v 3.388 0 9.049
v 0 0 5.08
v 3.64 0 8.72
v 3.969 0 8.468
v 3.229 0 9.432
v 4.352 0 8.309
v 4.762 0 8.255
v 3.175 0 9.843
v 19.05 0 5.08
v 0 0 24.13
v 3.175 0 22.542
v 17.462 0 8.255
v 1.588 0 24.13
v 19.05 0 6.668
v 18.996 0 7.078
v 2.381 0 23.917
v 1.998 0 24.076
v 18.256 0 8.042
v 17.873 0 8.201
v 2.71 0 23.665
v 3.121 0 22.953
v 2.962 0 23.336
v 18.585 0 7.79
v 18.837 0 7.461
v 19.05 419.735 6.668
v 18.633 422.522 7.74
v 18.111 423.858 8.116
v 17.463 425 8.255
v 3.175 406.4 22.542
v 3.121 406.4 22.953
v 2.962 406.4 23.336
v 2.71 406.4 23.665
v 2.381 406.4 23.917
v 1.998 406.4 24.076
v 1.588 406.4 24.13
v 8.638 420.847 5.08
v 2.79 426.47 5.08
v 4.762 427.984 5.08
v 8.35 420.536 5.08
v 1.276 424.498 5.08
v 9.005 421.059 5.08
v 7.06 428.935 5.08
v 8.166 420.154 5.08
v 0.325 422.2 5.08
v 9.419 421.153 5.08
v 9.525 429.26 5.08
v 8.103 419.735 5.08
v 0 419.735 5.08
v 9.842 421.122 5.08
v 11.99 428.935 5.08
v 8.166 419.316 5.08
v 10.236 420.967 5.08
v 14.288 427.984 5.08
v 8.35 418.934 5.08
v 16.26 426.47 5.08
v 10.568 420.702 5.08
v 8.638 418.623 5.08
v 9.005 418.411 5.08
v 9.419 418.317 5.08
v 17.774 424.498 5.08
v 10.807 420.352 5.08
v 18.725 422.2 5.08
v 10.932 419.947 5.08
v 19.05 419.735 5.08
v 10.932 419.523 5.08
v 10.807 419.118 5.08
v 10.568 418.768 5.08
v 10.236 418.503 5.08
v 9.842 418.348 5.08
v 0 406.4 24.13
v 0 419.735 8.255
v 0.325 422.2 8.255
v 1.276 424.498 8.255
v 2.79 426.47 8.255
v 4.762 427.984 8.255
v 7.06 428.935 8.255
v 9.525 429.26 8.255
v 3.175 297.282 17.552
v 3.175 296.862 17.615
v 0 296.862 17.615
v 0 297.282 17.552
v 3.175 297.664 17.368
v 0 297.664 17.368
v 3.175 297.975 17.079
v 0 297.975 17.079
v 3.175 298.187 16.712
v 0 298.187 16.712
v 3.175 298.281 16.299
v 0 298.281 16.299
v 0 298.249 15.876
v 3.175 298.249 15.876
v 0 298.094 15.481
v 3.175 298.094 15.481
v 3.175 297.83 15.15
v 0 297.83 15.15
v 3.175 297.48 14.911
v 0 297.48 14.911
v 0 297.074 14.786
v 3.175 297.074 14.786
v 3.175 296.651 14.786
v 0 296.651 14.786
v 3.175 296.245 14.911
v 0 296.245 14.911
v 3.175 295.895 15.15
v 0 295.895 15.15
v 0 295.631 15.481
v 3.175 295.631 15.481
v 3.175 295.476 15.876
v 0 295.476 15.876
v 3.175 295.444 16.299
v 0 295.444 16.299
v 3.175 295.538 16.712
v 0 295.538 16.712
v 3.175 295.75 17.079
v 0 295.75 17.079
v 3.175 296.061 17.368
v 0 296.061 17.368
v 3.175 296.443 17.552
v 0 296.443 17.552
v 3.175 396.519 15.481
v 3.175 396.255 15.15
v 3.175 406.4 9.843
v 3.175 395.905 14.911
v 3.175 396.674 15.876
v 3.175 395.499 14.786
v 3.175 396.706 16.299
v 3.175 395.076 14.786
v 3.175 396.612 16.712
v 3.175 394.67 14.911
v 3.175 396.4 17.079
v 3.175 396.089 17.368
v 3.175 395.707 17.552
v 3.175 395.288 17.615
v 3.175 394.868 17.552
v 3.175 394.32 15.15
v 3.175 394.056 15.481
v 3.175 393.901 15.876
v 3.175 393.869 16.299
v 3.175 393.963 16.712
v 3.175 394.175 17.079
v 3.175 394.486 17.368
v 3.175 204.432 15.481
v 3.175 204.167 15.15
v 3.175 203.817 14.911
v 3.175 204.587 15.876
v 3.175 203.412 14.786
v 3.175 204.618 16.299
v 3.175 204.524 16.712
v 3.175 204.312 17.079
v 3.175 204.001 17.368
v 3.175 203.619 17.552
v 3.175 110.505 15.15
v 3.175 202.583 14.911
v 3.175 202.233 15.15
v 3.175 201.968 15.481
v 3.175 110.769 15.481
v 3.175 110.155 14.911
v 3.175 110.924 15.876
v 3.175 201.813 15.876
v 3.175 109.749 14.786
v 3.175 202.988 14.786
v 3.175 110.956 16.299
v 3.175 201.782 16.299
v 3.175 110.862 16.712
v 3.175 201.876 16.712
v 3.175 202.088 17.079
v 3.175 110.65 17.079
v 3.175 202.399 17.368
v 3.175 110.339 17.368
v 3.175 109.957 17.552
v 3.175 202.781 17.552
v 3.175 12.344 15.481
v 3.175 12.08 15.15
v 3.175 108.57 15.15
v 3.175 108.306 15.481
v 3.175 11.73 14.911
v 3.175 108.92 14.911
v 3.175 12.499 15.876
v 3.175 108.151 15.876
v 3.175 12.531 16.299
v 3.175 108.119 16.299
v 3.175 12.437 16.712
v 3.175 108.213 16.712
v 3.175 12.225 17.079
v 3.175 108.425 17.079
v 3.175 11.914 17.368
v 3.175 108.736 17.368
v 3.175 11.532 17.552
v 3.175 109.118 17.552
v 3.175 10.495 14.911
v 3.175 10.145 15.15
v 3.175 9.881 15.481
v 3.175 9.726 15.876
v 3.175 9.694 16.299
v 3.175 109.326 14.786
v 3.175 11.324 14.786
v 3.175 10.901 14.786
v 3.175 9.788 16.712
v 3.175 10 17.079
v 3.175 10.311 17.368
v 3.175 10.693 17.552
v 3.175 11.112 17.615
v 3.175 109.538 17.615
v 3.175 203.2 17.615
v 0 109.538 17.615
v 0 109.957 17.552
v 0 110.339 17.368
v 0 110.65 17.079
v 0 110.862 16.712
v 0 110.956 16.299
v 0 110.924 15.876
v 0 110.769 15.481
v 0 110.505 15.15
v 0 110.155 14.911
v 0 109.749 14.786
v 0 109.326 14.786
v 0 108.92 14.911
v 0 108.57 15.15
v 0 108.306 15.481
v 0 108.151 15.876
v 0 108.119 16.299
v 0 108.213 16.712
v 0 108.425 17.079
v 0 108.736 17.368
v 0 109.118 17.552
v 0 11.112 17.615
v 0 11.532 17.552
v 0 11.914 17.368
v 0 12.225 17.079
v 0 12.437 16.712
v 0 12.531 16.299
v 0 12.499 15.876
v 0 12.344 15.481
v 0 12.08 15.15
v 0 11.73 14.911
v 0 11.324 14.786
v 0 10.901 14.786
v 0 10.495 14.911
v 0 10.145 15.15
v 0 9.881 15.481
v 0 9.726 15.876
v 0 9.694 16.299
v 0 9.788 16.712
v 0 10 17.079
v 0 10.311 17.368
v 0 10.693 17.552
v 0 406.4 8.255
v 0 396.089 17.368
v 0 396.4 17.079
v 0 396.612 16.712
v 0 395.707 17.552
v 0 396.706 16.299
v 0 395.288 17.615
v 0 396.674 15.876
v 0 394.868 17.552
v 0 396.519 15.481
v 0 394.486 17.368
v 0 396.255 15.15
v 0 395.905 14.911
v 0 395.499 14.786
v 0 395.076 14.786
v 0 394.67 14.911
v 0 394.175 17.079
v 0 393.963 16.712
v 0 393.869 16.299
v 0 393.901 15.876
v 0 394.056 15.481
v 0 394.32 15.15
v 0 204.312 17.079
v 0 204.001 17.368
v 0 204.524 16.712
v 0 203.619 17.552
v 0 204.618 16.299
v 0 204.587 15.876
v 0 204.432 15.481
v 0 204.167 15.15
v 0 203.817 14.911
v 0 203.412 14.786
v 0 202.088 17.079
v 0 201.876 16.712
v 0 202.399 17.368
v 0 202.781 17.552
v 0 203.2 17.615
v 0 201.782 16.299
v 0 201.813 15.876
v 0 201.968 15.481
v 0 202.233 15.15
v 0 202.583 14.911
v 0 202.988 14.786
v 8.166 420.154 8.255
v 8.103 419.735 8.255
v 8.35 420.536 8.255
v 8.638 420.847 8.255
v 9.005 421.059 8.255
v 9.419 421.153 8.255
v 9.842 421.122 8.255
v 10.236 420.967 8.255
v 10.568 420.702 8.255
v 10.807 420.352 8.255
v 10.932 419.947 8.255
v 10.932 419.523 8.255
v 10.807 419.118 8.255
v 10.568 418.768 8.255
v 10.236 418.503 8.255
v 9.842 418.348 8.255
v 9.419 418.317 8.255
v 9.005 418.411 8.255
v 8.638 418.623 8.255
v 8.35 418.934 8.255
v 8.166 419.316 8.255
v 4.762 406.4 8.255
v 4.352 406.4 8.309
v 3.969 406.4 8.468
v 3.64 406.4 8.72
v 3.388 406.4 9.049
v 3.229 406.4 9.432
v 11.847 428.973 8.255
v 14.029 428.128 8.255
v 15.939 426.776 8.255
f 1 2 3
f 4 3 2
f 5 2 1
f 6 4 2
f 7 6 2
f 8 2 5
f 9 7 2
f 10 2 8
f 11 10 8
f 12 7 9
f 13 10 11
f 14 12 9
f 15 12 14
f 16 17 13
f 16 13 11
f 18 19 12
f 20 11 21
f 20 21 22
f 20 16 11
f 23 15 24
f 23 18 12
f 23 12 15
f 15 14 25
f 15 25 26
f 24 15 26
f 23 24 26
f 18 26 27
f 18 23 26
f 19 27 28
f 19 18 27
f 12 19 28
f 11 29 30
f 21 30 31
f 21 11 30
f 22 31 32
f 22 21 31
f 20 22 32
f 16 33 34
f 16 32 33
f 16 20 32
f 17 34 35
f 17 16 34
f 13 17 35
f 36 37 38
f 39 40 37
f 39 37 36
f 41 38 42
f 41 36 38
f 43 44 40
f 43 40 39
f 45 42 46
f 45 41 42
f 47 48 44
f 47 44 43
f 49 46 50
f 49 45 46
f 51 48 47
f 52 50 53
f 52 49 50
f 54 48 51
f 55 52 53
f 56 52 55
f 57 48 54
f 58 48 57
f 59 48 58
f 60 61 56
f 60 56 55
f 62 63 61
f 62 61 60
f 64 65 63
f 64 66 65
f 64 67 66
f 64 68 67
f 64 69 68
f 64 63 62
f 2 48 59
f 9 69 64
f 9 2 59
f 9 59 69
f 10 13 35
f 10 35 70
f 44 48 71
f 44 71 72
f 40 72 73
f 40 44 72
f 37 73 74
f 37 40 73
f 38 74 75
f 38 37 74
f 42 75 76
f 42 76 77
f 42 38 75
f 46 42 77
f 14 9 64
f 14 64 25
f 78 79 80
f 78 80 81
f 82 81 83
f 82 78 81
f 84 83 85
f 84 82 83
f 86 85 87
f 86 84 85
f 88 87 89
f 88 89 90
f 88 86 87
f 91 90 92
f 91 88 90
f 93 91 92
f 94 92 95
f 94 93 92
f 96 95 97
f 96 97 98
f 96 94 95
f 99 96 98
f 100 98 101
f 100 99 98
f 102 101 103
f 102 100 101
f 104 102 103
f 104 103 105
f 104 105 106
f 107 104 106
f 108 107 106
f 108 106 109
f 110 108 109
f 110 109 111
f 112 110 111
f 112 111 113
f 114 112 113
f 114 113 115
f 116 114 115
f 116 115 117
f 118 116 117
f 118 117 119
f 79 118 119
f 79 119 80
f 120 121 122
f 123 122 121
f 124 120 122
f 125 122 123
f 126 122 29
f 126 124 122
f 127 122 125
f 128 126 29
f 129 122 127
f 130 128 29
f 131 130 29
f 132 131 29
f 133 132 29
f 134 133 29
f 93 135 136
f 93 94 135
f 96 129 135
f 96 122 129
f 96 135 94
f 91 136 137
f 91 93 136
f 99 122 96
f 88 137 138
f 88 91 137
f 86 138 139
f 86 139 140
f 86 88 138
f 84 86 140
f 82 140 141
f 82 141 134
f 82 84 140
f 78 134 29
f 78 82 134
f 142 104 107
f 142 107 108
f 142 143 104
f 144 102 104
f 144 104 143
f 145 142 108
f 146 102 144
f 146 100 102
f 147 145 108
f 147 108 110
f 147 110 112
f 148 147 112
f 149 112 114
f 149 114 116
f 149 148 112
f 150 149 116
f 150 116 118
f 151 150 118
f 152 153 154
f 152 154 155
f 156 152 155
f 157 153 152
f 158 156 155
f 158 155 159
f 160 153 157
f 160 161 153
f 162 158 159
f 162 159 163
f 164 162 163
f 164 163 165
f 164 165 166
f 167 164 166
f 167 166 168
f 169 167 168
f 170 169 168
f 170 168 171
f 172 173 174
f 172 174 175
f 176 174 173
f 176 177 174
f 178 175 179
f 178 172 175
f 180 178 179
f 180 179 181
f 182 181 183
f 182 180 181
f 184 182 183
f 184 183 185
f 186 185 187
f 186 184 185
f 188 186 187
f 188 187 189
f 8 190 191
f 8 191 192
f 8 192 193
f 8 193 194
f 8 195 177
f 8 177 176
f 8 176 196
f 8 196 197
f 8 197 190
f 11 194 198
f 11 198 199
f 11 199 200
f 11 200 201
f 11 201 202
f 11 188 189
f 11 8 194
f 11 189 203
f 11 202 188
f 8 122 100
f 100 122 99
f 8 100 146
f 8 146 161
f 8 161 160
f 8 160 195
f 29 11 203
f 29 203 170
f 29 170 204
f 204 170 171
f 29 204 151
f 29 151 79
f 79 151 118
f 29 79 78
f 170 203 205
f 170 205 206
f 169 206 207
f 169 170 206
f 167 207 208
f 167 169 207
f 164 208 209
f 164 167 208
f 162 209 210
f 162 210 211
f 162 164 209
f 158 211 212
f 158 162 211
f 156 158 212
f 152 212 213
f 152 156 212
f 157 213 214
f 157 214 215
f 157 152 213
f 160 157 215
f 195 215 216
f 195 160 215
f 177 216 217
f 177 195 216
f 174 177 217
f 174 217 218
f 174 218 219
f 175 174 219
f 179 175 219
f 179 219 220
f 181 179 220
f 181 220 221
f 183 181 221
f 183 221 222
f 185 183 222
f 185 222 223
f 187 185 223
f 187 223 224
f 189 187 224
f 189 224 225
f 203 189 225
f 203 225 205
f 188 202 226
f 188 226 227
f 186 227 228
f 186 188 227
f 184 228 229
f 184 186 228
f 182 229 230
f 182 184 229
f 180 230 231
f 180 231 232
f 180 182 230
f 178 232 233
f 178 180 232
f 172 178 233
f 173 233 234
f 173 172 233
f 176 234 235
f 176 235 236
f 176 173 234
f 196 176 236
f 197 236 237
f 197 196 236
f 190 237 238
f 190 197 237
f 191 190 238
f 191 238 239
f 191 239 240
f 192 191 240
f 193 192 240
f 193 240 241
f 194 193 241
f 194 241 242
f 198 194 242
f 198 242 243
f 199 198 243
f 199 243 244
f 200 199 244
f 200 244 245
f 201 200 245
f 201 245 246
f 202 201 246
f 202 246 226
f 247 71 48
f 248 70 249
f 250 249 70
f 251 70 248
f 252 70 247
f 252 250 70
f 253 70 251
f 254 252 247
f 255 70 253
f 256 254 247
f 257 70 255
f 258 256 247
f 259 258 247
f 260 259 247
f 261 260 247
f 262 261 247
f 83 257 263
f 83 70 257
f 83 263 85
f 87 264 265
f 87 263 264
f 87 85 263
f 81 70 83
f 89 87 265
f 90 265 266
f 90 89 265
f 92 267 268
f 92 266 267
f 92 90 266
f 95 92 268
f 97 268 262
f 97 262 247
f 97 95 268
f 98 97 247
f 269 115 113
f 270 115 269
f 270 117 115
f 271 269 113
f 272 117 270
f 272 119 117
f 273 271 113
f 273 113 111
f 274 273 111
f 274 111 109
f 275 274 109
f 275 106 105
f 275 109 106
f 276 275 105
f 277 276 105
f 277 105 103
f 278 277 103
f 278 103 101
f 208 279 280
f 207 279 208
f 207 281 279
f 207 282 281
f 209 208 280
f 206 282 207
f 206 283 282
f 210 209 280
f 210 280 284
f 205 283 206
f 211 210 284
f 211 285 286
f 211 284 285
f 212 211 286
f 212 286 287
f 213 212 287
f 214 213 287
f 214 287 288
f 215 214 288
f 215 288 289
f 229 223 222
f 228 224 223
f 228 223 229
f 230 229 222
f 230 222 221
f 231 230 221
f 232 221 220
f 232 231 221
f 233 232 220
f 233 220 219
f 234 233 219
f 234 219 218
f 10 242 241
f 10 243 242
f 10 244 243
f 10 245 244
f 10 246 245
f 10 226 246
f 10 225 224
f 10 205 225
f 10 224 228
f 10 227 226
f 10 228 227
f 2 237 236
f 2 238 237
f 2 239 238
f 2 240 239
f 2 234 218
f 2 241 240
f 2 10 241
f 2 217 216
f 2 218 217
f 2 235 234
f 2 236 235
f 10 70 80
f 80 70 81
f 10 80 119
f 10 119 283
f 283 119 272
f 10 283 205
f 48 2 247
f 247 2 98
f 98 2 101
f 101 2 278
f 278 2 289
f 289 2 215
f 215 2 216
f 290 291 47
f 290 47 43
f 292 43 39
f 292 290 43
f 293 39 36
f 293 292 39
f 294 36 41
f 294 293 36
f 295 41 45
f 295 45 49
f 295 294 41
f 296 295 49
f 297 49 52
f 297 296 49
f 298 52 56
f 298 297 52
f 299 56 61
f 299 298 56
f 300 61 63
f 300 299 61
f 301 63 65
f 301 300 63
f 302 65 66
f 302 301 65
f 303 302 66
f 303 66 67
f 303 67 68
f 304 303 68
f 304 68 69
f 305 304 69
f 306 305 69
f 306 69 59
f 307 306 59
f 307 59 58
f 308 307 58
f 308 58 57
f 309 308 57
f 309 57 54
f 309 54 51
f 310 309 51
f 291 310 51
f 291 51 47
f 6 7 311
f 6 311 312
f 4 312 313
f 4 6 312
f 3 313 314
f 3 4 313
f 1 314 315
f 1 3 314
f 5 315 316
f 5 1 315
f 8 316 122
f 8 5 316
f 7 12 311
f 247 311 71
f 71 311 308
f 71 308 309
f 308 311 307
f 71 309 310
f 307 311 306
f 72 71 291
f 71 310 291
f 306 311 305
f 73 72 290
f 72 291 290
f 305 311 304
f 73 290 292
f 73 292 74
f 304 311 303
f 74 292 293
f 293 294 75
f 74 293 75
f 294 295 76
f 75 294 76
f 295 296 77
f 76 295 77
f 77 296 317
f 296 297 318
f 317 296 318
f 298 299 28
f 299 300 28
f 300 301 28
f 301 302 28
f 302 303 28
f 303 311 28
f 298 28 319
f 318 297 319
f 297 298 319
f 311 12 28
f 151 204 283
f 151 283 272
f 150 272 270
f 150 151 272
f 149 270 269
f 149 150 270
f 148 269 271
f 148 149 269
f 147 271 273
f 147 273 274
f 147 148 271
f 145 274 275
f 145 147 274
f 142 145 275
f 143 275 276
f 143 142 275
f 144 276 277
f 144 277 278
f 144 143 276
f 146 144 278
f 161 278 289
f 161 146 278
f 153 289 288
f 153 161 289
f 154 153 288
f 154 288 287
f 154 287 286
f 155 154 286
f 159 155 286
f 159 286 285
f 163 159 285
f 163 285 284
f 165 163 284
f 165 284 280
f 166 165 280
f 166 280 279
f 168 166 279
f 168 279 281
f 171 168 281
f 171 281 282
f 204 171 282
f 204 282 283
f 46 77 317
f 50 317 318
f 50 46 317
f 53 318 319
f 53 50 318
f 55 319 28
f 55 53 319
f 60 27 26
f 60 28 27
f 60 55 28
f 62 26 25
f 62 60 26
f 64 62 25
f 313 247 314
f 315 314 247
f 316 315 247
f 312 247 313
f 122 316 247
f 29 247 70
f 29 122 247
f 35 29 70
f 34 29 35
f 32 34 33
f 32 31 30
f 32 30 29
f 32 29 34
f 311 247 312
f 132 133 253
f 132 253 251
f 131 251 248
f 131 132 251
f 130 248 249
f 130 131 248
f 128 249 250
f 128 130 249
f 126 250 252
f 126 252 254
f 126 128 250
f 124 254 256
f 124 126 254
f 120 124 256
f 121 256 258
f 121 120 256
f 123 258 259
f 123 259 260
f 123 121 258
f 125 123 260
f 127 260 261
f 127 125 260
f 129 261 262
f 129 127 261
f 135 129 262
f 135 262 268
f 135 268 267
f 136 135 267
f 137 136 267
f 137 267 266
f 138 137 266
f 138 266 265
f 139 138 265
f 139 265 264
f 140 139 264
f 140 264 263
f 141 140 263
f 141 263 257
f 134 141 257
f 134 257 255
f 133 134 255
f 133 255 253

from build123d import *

# Parameters (mm, degrees)
BOSS_EXTRUDE1_DEPTH = 431.8
SKETCH4_W           = 15.875
SKETCH4_H           = 25.4
CUT_EXTRUDE1_DEPTH  = 6.35
SKETCH5_W           = 1.5875
SKETCH5_H           = 25.4
CUT_EXTRUDE2_DEPTH  = 6.35
SKETCH6_R           = 1.4224
CUT_EXTRUDE3_DEPTH  = 5.08
CUT_EXTRUDE4_START  = -2.54
CUT_EXTRUDE4_DEPTH  = 2.54
SKETCH8_R           = 1.4224
CUT_EXTRUDE5_DEPTH  = 5.08
SKETCH9_W           = 28.861002292
SKETCH9_H           = 547.524656259
CUT_EXTRUDE6_DEPTH  = 30.48
CUT_EXTRUDE7_DEPTH  = 5.08


with BuildPart() as part:
    # Sketch2 → Boss-Extrude1 (new body)
    with BuildSketch(Plane(origin=(0, 0, 0), x_dir=(1, 0, 0), z_dir=(0, 1, 0))):
        with BuildLine():
            Line((0, 0), (19.05, 0))
            Line((19.05, 0), (19.05, 1.5875))
            ThreePointArc((19.05, 1.5875), (18.585032015, 2.710032015), (17.4625, 3.175))
            Line((17.4625, 3.175), (4.7625, 3.175))
            ThreePointArc((4.7625, 3.175), (3.639967985, 3.639967985), (3.175, 4.7625))
            Line((3.175, 4.7625), (3.175, 17.4625))
            ThreePointArc((3.175, 17.4625), (2.710032015, 18.585032015), (1.5875, 19.05))
            Line((1.5875, 19.05), (0, 19.05))
            Line((0, 19.05), (0, 0))
        make_face()
    extrude(amount=BOSS_EXTRUDE1_DEPTH)

    # Sketch4 → Cut-Extrude1 (cut)
    with BuildSketch(Plane(origin=(3.175, 0, 0), x_dir=(0, 0, -1), z_dir=(1, 0, 0))):
        with Locations((11.1125, 419.1)):
            Rectangle(SKETCH4_W, SKETCH4_H)
    extrude(amount=-CUT_EXTRUDE1_DEPTH, mode=Mode.SUBTRACT)

    # Sketch5 → Cut-Extrude2 (cut)
    with BuildSketch(Plane.ZY.offset(-3.175)):
        with Locations((-3.96875, 419.1)):
            Rectangle(SKETCH5_W, SKETCH5_H)
    extrude(amount=-CUT_EXTRUDE2_DEPTH, mode=Mode.SUBTRACT)

    # Sketch6 → Cut-Extrude3 (cut)
    with BuildSketch(Plane(origin=(3.175, 0, 0), x_dir=(0, 0, -1), z_dir=(1, 0, 0))):
        with Locations((11.1125, 109.5375)):
            Circle(SKETCH6_R)
        with Locations((11.1125, 203.2)):
            Circle(SKETCH6_R)
        with Locations((11.1125, 296.8625)):
            Circle(SKETCH6_R)
        with Locations((11.1125, 11.1125)):
            Circle(SKETCH6_R)
        with Locations((11.1125, 395.2875)):
            Circle(SKETCH6_R)
    extrude(amount=-CUT_EXTRUDE3_DEPTH, mode=Mode.SUBTRACT)

    # Sketch7 → Cut-Extrude4 (cut)
    with BuildSketch(Plane(origin=(0, 431.8, 0), x_dir=(1, 0, 0), z_dir=(0, 1, 0)).offset(CUT_EXTRUDE4_START)):
        with BuildLine():
            Line((17.4625, 3.175), (0, 3.175))
            Line((0, 3.175), (0, 0))
            Line((0, 0), (19.05, 0))
            Line((19.05, 0), (19.05, 1.5875))
            ThreePointArc((19.05, 1.5875), (18.585032015, 2.710032015), (17.4625, 3.175))
        make_face()
    extrude(amount=CUT_EXTRUDE4_DEPTH, mode=Mode.SUBTRACT)

    # Sketch8 → Cut-Extrude5 (cut)
    with BuildSketch(Plane(origin=(0, 0, -3.175), x_dir=(-1, 0, 0), z_dir=(0, 0, -1))):
        with Locations((-9.525, 419.735)):
            Circle(SKETCH8_R)
    extrude(amount=-CUT_EXTRUDE5_DEPTH, mode=Mode.SUBTRACT)


with BuildPart() as body_2:
    # Mirror3: mirrored copy
    add(part.part.mirror(Plane.XY.offset(2.54)))

    # Sketch10 → Cut-Extrude7 (cut)
    with BuildSketch(Plane.XY.offset(8.255)):
        with BuildLine():
            Line((19.05, 419.735), (19.05, 429.26))
            Line((19.05, 429.26), (9.525, 429.26))
            ThreePointArc((9.525, 429.26), (16.260192091, 426.470192091), (19.05, 419.735))
        make_face()
        with BuildLine():
            ThreePointArc((0, 419.735), (2.789807909, 426.470192091), (9.525, 429.26))
            Line((9.525, 429.26), (0, 429.26))
            Line((0, 429.26), (0, 419.735))
        make_face()
    extrude(amount=-CUT_EXTRUDE7_DEPTH, mode=Mode.SUBTRACT)


with BuildPart() as part_1:
    add(part.part)

    # Sketch9 → Cut-Extrude6 (cut)
    with BuildSketch(Plane.XY.offset(2.54)):
        with Locations((7.805746781, 195.778589833)):
            Rectangle(SKETCH9_W, SKETCH9_H)
    extrude(amount=-CUT_EXTRUDE6_DEPTH, mode=Mode.SUBTRACT)


solid = body_2.part
